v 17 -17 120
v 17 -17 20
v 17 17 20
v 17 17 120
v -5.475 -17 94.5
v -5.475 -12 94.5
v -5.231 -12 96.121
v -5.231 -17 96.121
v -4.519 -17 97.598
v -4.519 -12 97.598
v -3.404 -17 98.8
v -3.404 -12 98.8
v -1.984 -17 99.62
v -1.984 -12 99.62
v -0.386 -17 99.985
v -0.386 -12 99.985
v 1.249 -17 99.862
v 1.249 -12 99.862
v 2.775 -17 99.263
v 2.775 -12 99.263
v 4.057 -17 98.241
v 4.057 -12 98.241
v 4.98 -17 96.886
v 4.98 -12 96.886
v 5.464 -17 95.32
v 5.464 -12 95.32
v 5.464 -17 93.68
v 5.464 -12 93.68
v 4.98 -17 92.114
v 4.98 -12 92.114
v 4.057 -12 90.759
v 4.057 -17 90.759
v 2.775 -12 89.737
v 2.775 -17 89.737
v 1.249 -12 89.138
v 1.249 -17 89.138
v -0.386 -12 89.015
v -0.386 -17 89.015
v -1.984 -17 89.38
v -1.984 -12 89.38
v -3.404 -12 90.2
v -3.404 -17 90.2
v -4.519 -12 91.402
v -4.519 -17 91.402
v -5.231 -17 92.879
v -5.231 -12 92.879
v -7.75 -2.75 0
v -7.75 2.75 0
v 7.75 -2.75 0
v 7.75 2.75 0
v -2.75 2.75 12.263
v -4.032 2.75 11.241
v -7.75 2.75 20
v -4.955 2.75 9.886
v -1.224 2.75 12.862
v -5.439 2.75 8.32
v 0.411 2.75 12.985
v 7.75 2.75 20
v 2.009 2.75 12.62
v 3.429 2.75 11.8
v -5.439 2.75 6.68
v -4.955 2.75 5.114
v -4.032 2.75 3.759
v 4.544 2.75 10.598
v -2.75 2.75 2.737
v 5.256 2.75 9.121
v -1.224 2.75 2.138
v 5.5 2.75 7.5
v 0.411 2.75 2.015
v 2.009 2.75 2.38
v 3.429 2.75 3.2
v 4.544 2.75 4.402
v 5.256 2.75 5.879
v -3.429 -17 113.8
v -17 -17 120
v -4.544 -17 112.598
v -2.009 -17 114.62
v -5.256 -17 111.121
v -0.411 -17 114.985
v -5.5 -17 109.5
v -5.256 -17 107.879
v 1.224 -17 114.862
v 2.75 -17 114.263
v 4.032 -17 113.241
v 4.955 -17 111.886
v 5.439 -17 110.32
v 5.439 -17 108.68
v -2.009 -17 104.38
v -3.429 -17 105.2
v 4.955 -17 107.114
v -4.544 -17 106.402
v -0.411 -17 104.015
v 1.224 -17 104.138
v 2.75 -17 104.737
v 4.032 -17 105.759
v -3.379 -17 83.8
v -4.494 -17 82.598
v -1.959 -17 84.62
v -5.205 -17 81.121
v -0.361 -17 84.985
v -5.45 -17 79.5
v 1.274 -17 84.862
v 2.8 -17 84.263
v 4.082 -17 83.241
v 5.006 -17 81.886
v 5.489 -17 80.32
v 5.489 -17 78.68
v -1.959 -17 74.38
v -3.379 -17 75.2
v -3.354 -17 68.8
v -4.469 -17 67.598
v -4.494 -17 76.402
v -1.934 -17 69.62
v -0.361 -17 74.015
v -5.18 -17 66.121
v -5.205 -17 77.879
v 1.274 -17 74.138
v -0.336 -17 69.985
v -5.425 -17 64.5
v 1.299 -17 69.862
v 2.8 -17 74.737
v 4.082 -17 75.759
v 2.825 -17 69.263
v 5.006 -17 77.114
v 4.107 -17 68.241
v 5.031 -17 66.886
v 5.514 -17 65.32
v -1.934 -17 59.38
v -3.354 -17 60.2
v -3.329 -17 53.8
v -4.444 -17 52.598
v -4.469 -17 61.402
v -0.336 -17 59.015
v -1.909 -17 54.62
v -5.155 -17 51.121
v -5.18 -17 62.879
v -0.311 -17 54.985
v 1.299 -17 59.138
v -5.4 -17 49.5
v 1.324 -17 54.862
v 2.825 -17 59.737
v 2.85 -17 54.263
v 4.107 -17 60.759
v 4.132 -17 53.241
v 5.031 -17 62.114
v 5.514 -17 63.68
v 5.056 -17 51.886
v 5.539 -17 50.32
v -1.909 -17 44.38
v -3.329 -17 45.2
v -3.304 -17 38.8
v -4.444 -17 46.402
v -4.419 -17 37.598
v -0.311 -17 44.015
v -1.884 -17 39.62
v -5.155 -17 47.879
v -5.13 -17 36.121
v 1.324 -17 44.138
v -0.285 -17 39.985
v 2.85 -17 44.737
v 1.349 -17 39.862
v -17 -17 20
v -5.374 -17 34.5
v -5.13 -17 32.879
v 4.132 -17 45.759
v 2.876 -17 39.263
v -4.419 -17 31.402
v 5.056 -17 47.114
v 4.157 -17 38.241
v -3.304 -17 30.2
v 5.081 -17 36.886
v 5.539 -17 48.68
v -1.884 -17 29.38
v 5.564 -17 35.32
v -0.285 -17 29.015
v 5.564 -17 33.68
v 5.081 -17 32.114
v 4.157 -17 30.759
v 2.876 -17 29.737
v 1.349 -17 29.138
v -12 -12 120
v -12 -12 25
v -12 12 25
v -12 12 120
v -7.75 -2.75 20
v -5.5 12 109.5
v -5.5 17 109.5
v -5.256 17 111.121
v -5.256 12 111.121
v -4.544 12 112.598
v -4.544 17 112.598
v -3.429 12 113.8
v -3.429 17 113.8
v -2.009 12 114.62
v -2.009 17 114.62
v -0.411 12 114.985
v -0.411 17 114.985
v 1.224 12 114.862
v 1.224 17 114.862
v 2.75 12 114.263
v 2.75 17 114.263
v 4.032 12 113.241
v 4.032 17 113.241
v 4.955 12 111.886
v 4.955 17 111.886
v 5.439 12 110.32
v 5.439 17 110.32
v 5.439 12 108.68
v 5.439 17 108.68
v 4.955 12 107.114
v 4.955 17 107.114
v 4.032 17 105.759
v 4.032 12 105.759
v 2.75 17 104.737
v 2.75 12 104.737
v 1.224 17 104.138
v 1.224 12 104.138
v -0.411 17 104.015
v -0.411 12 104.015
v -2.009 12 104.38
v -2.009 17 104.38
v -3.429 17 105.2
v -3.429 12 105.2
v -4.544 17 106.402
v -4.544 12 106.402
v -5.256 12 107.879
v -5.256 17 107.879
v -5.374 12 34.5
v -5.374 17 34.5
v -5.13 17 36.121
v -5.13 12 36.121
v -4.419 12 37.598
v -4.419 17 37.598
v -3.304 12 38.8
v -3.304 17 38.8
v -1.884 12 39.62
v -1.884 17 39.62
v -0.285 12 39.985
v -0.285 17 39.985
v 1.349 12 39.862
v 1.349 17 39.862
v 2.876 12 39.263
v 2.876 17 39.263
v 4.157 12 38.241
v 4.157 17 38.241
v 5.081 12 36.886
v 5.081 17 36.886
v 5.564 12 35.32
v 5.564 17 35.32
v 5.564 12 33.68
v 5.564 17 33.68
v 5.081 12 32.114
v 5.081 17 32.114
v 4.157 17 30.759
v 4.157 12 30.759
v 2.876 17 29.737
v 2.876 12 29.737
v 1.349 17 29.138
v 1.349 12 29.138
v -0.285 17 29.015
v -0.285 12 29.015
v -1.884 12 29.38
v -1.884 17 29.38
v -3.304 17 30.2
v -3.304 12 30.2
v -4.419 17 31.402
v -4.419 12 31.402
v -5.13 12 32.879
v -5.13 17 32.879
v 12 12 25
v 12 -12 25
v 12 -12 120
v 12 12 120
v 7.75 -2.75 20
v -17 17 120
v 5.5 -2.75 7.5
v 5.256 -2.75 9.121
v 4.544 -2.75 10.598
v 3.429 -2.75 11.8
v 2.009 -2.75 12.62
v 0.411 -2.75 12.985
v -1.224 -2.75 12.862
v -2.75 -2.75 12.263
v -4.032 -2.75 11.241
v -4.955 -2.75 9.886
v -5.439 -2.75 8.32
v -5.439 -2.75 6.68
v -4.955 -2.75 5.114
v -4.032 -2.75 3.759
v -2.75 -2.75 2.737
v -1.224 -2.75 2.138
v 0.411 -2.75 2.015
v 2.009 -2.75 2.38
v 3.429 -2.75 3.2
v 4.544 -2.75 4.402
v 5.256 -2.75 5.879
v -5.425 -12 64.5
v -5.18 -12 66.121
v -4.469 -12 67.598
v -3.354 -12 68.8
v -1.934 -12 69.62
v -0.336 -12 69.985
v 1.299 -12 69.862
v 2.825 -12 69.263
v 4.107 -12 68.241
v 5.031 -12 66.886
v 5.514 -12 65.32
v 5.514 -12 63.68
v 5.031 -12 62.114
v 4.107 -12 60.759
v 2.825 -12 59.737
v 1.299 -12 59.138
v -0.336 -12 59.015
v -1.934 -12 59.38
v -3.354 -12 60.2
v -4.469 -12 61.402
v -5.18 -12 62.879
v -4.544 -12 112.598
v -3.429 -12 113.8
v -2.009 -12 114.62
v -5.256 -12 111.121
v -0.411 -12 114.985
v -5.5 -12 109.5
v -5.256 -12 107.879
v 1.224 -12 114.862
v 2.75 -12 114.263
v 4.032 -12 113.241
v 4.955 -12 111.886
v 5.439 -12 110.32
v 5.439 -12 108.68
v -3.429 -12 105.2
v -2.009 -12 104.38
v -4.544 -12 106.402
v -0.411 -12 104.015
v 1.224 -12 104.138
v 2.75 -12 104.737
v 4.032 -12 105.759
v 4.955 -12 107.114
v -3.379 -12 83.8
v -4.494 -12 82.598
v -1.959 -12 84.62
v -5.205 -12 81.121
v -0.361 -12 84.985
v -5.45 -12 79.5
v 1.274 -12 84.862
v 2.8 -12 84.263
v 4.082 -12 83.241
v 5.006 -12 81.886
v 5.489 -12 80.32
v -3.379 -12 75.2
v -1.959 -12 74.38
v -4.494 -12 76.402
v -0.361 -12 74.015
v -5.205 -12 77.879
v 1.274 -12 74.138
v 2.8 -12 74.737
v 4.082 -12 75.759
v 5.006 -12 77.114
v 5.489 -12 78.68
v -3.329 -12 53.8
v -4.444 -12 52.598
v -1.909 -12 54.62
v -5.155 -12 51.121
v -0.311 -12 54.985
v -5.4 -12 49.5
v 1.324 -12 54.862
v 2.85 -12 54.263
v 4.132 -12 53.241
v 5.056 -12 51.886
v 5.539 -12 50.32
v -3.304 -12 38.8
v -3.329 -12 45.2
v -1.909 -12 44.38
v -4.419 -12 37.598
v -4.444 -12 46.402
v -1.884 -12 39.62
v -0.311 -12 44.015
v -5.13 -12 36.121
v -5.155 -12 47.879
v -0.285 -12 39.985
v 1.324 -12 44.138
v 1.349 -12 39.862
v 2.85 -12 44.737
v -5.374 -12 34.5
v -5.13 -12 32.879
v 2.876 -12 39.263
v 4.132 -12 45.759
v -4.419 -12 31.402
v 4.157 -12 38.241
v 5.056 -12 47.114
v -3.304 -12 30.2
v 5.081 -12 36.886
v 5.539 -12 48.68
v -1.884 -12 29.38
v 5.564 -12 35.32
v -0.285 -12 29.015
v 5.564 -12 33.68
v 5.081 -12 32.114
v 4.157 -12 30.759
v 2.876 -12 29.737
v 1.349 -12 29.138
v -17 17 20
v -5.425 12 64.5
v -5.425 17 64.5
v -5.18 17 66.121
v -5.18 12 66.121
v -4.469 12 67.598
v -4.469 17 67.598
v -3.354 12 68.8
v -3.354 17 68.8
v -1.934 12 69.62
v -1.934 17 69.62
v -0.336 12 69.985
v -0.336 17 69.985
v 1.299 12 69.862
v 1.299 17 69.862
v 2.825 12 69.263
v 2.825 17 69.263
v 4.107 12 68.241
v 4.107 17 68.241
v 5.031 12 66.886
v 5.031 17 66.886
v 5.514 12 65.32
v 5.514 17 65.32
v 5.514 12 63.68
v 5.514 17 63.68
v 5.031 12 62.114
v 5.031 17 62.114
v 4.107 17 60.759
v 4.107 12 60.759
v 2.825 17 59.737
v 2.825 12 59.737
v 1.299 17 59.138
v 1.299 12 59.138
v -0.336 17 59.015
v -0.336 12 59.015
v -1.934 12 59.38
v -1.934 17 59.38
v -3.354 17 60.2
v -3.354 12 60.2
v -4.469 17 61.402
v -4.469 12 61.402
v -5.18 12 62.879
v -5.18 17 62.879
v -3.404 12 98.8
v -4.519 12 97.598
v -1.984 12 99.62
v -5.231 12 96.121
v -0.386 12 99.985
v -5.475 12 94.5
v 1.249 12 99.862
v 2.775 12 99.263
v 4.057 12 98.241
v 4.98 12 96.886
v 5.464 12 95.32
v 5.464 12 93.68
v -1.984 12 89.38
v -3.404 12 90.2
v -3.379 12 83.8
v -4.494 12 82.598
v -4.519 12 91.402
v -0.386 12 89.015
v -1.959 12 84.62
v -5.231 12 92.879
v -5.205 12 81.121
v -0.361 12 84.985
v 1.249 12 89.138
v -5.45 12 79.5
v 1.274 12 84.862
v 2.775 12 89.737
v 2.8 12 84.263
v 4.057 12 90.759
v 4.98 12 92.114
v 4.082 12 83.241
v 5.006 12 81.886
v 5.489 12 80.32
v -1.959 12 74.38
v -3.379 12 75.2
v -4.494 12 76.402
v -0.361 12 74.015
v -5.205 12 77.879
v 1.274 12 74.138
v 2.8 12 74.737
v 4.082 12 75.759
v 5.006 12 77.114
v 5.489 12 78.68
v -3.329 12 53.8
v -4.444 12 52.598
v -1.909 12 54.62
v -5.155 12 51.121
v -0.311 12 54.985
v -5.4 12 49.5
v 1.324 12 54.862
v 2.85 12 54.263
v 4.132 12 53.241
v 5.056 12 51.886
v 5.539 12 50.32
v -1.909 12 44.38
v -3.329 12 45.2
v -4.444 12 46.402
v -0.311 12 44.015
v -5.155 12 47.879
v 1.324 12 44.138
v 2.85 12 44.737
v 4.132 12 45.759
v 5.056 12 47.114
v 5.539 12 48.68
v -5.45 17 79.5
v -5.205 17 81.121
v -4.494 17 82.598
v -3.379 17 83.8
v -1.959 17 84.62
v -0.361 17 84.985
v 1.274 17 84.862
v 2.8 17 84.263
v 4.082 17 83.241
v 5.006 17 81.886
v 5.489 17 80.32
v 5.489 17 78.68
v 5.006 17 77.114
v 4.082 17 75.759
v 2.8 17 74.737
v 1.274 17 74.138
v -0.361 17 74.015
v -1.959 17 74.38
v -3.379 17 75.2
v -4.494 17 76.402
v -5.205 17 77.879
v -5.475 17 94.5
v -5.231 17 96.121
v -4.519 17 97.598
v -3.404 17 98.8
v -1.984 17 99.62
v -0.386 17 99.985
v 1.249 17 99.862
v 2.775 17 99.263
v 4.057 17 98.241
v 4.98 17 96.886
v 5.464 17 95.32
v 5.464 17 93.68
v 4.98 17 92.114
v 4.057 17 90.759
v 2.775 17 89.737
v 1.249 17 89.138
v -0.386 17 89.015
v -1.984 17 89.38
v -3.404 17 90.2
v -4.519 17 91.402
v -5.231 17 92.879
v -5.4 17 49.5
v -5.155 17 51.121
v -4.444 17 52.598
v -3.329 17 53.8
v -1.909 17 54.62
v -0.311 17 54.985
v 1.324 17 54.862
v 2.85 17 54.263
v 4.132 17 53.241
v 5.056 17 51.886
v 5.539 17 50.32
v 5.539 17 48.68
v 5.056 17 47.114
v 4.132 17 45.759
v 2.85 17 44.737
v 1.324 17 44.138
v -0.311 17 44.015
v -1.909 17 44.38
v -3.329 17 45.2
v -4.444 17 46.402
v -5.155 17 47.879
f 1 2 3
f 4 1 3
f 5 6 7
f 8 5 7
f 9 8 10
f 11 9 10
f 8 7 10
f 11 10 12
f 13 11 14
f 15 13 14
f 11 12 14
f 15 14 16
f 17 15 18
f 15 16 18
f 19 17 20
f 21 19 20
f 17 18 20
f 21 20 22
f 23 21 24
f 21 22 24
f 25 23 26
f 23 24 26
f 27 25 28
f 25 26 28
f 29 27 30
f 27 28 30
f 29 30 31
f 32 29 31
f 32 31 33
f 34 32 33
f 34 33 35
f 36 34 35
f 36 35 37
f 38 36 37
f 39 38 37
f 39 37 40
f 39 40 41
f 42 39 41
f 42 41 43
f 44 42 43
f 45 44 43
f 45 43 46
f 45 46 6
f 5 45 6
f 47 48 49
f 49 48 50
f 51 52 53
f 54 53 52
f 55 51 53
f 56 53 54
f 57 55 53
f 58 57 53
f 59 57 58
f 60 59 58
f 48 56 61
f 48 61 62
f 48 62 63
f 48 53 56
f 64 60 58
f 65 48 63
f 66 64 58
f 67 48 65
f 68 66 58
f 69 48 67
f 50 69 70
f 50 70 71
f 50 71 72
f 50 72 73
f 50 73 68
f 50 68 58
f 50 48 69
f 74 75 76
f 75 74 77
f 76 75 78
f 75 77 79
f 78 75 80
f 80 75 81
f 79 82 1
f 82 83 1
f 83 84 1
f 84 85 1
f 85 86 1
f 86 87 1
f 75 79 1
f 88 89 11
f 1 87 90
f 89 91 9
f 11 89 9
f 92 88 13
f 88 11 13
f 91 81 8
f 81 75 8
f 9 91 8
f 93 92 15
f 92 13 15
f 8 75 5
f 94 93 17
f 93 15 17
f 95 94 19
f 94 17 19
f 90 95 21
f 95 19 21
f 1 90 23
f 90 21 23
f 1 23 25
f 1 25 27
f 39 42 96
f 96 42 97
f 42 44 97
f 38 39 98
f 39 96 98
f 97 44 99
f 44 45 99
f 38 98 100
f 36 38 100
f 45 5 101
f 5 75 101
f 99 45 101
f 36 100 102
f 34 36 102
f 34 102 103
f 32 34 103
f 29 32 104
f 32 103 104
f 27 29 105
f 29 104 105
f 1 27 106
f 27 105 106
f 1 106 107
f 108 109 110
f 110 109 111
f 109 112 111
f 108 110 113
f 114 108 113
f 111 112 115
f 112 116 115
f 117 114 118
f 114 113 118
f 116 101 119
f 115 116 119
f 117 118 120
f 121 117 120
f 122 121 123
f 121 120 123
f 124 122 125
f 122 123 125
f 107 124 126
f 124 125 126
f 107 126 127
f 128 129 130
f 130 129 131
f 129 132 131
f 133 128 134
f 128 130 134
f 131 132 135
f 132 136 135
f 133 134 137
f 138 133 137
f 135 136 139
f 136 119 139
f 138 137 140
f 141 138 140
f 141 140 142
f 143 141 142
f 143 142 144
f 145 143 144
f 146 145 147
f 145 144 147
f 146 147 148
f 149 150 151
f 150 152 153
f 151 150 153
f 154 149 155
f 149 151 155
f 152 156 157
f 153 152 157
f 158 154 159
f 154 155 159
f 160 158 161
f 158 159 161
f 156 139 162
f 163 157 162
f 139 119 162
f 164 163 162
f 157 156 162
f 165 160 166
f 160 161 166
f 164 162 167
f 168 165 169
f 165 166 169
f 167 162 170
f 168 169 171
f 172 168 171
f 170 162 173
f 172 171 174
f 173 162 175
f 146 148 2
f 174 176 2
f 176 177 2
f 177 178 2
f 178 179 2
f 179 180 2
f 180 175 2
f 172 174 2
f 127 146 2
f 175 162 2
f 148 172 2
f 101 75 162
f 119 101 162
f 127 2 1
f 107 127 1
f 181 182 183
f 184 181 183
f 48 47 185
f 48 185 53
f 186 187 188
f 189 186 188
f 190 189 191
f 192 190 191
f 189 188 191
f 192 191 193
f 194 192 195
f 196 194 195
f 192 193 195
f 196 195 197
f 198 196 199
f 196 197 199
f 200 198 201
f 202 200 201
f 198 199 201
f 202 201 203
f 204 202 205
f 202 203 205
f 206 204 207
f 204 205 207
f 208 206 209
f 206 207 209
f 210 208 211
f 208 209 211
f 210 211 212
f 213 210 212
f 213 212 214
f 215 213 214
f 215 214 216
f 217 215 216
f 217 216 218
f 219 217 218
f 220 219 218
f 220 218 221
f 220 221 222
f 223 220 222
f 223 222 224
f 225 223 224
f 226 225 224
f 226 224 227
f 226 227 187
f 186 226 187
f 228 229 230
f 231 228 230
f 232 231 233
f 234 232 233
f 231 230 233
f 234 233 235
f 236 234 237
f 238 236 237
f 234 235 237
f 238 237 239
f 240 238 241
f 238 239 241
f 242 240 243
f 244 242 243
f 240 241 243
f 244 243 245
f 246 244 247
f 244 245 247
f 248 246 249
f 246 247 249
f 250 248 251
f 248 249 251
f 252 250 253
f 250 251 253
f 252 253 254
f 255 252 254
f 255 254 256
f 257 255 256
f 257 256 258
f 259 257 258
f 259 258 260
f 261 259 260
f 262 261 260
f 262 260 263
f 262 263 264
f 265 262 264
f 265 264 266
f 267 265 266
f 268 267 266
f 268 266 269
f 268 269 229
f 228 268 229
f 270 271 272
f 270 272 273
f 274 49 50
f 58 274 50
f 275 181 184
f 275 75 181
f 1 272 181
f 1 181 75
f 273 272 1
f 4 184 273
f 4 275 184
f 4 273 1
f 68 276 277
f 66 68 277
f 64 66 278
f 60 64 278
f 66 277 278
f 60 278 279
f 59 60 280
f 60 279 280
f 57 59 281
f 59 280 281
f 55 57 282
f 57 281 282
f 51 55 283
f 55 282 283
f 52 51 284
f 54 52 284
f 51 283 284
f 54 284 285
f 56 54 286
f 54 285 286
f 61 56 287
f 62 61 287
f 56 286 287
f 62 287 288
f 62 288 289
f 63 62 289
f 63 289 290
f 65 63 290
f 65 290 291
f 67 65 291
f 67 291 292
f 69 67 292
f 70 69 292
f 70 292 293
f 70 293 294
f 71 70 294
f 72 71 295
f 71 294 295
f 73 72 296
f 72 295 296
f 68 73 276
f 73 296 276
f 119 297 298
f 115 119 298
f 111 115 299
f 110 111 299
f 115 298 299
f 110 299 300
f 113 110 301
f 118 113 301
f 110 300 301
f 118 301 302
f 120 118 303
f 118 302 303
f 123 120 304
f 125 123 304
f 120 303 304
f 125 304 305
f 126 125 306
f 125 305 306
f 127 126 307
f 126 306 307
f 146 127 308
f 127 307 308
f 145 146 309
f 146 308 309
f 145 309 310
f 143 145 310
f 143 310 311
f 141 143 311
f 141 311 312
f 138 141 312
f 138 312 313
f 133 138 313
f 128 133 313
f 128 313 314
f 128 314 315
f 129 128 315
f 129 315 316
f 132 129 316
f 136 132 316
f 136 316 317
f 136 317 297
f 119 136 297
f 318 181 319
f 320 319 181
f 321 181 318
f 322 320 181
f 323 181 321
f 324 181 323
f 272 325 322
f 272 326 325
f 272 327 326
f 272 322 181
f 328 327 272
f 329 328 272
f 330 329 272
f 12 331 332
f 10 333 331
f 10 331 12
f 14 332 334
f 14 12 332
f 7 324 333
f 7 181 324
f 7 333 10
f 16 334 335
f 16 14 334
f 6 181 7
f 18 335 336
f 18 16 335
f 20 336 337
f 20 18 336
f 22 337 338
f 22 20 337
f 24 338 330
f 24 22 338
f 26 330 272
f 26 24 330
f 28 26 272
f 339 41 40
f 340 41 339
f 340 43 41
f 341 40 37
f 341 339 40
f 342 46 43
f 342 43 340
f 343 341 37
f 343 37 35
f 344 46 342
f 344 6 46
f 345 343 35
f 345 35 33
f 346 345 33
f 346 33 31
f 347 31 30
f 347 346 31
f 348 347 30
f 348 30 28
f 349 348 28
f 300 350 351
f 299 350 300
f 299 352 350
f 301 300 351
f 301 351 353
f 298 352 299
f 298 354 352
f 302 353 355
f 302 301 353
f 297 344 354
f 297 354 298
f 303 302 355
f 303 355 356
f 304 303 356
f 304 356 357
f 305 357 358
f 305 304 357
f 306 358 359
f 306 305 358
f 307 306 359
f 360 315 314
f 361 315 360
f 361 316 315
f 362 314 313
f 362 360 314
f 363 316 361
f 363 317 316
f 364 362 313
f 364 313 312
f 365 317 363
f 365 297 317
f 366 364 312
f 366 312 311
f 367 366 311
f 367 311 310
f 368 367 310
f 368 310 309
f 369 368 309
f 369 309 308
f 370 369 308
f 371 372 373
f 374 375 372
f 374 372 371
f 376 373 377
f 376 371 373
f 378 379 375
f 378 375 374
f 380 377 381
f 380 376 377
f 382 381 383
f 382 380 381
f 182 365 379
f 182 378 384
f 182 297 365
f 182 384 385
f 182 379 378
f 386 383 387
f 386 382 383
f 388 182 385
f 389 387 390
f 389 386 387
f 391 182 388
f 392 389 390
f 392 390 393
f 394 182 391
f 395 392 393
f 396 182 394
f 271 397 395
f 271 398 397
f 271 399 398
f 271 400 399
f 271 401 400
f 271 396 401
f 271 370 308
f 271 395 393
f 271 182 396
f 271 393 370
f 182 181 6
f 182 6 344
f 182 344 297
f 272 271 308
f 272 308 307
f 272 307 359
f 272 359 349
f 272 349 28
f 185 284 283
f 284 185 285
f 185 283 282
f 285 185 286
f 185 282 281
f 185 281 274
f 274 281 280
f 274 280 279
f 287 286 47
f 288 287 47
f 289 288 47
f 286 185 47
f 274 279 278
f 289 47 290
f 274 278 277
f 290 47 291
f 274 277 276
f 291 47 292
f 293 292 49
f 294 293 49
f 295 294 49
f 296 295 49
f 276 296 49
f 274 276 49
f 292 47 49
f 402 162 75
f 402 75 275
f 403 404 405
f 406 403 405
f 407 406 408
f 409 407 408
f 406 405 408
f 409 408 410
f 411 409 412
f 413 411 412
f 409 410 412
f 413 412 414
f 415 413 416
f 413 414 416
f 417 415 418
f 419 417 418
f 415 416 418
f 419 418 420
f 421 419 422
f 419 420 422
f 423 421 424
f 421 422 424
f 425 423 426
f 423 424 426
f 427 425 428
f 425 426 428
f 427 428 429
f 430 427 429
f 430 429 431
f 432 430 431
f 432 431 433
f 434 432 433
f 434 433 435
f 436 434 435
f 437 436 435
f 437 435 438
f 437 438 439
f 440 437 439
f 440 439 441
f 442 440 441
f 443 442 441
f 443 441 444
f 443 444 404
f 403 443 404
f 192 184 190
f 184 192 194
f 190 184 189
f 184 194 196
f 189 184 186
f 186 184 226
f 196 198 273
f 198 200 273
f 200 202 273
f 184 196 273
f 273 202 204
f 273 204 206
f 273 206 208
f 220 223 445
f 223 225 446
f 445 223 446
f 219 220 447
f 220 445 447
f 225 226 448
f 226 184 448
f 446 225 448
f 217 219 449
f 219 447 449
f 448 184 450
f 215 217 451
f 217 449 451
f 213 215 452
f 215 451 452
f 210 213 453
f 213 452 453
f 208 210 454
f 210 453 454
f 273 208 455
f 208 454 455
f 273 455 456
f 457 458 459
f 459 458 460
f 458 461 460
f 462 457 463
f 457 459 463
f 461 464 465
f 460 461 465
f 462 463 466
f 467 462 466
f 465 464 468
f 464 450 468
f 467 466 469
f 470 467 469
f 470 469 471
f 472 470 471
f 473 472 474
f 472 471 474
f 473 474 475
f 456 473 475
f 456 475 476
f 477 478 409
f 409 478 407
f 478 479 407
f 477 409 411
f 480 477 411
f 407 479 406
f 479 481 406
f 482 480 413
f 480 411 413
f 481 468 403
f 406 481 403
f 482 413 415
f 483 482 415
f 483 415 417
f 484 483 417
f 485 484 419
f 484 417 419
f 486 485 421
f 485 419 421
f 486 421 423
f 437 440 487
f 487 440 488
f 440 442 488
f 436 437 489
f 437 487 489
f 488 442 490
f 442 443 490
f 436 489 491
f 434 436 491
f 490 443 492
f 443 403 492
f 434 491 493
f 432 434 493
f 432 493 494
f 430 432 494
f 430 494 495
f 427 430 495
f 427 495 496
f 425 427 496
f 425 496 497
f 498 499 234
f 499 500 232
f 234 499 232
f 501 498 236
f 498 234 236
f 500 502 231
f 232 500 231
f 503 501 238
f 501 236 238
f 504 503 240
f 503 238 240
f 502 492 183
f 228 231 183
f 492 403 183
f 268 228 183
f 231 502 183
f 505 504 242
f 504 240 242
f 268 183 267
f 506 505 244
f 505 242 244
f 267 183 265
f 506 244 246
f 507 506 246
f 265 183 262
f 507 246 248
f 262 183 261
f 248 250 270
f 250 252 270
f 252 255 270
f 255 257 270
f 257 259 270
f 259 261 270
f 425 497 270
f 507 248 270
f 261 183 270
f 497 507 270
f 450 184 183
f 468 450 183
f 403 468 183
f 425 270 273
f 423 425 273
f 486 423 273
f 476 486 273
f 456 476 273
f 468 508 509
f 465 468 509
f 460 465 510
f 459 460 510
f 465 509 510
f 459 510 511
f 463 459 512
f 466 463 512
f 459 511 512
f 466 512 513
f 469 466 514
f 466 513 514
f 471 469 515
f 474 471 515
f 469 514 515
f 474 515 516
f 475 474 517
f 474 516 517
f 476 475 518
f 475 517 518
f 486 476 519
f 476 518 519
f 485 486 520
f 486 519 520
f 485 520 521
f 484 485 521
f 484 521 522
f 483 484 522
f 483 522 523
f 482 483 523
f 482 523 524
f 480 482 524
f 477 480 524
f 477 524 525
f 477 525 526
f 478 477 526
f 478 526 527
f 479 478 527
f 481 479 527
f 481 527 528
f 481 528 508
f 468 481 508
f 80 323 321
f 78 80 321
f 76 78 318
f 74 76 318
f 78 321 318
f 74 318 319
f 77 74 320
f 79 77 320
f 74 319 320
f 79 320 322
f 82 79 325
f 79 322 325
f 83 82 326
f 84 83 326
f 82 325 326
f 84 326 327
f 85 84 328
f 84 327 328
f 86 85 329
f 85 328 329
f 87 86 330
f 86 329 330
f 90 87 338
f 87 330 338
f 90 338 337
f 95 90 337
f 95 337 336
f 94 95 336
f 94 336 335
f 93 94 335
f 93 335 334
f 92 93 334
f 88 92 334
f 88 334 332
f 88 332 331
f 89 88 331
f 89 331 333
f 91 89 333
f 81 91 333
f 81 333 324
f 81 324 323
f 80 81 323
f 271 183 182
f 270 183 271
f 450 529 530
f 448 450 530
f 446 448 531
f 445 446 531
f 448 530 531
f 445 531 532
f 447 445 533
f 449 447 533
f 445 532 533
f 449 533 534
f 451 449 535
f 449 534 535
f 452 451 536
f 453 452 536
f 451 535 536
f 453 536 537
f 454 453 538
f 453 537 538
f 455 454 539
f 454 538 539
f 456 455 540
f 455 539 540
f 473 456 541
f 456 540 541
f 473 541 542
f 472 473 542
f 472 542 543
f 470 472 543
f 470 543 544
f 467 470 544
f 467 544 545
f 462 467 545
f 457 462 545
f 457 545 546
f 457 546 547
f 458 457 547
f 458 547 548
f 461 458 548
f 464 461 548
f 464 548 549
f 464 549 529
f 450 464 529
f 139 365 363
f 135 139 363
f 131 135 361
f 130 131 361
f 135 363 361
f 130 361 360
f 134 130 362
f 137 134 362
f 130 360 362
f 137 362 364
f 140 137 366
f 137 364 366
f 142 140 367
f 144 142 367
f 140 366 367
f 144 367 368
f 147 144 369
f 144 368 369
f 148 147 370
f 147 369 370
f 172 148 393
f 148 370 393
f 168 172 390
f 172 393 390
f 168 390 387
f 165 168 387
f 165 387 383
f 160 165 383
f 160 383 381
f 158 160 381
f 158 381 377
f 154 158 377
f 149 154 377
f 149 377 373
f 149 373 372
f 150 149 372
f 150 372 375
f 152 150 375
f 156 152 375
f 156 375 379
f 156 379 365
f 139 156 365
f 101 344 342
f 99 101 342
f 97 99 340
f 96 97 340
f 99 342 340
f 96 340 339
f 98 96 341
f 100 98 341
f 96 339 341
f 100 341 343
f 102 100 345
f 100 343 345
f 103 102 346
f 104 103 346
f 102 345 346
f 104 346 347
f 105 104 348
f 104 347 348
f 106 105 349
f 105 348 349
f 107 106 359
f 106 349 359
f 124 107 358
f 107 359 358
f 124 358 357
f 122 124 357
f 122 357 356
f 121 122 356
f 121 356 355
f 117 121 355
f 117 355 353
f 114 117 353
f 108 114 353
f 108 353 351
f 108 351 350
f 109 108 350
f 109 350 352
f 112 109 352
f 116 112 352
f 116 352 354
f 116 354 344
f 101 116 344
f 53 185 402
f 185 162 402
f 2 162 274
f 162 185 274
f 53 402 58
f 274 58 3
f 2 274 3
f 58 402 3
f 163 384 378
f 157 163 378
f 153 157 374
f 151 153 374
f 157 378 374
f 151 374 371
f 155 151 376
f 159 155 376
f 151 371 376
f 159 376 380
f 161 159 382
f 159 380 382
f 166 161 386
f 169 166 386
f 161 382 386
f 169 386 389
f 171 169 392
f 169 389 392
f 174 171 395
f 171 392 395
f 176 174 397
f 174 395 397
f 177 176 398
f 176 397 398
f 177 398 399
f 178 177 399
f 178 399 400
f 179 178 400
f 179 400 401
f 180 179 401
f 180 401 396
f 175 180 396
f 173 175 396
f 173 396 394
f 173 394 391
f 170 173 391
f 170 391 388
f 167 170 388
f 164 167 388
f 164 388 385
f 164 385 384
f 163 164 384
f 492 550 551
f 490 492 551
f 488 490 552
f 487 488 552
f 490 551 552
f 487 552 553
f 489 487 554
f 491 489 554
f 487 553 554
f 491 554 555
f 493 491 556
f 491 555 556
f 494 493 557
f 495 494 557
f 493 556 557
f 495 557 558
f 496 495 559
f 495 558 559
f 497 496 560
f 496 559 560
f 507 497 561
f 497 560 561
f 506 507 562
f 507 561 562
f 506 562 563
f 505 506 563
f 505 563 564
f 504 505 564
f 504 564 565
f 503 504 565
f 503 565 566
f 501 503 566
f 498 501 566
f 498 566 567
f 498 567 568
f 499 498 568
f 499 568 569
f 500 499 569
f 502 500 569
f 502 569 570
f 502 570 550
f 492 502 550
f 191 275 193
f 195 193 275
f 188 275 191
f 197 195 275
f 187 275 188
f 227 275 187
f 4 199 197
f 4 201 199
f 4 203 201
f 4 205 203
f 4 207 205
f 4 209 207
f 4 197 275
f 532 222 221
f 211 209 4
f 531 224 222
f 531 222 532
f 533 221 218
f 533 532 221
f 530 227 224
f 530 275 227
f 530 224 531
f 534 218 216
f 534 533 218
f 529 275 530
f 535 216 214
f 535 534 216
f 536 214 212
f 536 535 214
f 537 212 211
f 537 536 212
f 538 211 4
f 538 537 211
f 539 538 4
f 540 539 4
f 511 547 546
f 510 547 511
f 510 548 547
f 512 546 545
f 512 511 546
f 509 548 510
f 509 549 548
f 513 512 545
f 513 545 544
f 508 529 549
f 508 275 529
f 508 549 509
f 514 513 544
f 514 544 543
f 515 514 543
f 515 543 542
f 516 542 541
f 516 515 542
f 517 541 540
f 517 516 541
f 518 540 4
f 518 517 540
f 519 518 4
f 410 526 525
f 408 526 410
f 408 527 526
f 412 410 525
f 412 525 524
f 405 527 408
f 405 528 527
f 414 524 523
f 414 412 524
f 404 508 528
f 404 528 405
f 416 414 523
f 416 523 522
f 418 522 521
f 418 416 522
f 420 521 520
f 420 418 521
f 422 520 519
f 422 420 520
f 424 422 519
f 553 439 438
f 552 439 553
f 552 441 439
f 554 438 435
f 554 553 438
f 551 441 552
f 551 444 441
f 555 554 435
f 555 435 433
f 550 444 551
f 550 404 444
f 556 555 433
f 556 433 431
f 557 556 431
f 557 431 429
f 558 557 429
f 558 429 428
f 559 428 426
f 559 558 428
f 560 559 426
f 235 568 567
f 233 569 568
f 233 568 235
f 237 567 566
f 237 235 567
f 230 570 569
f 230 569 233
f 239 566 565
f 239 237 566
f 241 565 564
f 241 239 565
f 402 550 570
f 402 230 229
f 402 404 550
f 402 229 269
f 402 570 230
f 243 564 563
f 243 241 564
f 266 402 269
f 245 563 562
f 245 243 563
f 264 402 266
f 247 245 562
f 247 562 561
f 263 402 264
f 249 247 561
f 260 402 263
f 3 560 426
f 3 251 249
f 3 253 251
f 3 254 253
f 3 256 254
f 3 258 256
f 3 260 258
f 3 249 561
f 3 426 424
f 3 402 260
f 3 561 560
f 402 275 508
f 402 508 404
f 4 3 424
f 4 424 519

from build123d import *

# Parameters (mm, degrees)
F0_W        = 15.5
F0_H        = 5.5
F1_DEPTH    = 20
F2_R        = 5.5
F3_DEPTH    = 5.5
F4_W        = 34
F4_H        = 34
F4_W_2      = 15.5
F4_H_2      = 5.5
F5_DEPTH    = 100
F6_T        = 5
F6_T3_DEPTH = 15.5
F6_T5_DEPTH = 25.5
F7_R        = 5.5
F8_DEPTH    = 34


# Not quite as in the source:
# - a shell that OpenCascade refuses in one call is made with other operations: the cavity is built on its own and cut out


with BuildPart() as f1:
    # F0 (on Top) → F1 (new body)
    with BuildSketch(Plane.XY):
        Rectangle(F0_W, F0_H)
    extrude(amount=F1_DEPTH)

    # F2 (on face) → F3 (cut, through all)
    with BuildSketch(Plane.XZ.offset(2.75)):
        with Locations((0, 7.5)):
            Circle(F2_R)
    extrude(amount=-F3_DEPTH, mode=Mode.SUBTRACT)

    # F4 (on face) → F5 (join)
    with BuildSketch(Plane.XY.offset(20)):
        Rectangle(F4_W, F4_H)
        Rectangle(F4_W_2, F4_H_2, mode=Mode.SUBTRACT)
        Rectangle(F4_W_2, F4_H_2)
    extrude(amount=F5_DEPTH)

    # F6: shell of thickness 5, made by hand


with BuildPart() as f6_core1:
    # F6_t2: copy of F1
    add(f1.part)

    # the walls: a layer under each face that stays
    f6_faces = [f6_core1.faces().sort_by_distance(p)[0] for p in [
        (17, 0, 70),
        (0, -17, 70),
        (0, 17, 70),
        (-11.3333333333, -11.3333333333, 20),
        (-17, 0, 70),
        (7.75, 0, 10),
        (5.1666666667, 2.75, 16.6666666667),
        (-7.75, 0, 10),
        (-5.1666666667, -2.75, 16.6666666667),
        (0, 0, 0),
        (-5.5, 0, 7.5),
    ]]
    thicken(f6_faces, amount=-F6_T, mode=Mode.SUBTRACT)

    # F6_s4 → F6_t3 (cut)
    with BuildSketch(Plane.XZ.offset(-7.75)):
        Polygon((7.8, 19.95), (7.75, 25), (2.75, 25), (2.75, 20), align=None)
        Polygon((-7.8, 19.95), (-7.75, 25), (-2.75, 25), (-2.75, 20), align=None)
    extrude(amount=F6_T3_DEPTH, mode=Mode.SUBTRACT)

    # F6_s6 → F6_t5 (cut)
    with BuildSketch(Plane.YZ.offset(-12.75)):
        Polygon((2.8, 19.95), (2.75, 25), (-2.25, 25), (-2.25, 20), align=None)
        Polygon((-2.8, 19.95), (-2.75, 25), (2.25, 25), (2.25, 20), align=None)
    extrude(amount=F6_T5_DEPTH, mode=Mode.SUBTRACT)


with BuildPart() as f1_1:
    add(f1.part)

    # what is left inside the walls is the cavity
    f6_cavity = [f6_core1.part.solids().sort_by_distance(p)[0] for p in [
        (11.95, 0, 88.333333),
    ]]
    add(f6_cavity, mode=Mode.SUBTRACT)

    # F7 (on face) → F8 (cut, through all)
    with BuildSketch(Plane(origin=(0, 17, 0), x_dir=(-1, 0, 0), z_dir=(0, 1, 0))):
        with Locations((0, 109.5)):
            Circle(F7_R)
        with Locations((-0.0251045674, 94.500021008)):
            Circle(F7_R)
        with Locations((-0.0502091347, 79.500042016)):
            Circle(F7_R)
        with Locations((-0.0753137021, 64.500063024)):
            Circle(F7_R)
        with Locations((-0.1004182694, 49.500084032)):
            Circle(F7_R)
        with Locations((-0.1255228368, 34.50010504)):
            Circle(F7_R)
    extrude(amount=-F8_DEPTH, mode=Mode.SUBTRACT)


solid = f1_1.part
